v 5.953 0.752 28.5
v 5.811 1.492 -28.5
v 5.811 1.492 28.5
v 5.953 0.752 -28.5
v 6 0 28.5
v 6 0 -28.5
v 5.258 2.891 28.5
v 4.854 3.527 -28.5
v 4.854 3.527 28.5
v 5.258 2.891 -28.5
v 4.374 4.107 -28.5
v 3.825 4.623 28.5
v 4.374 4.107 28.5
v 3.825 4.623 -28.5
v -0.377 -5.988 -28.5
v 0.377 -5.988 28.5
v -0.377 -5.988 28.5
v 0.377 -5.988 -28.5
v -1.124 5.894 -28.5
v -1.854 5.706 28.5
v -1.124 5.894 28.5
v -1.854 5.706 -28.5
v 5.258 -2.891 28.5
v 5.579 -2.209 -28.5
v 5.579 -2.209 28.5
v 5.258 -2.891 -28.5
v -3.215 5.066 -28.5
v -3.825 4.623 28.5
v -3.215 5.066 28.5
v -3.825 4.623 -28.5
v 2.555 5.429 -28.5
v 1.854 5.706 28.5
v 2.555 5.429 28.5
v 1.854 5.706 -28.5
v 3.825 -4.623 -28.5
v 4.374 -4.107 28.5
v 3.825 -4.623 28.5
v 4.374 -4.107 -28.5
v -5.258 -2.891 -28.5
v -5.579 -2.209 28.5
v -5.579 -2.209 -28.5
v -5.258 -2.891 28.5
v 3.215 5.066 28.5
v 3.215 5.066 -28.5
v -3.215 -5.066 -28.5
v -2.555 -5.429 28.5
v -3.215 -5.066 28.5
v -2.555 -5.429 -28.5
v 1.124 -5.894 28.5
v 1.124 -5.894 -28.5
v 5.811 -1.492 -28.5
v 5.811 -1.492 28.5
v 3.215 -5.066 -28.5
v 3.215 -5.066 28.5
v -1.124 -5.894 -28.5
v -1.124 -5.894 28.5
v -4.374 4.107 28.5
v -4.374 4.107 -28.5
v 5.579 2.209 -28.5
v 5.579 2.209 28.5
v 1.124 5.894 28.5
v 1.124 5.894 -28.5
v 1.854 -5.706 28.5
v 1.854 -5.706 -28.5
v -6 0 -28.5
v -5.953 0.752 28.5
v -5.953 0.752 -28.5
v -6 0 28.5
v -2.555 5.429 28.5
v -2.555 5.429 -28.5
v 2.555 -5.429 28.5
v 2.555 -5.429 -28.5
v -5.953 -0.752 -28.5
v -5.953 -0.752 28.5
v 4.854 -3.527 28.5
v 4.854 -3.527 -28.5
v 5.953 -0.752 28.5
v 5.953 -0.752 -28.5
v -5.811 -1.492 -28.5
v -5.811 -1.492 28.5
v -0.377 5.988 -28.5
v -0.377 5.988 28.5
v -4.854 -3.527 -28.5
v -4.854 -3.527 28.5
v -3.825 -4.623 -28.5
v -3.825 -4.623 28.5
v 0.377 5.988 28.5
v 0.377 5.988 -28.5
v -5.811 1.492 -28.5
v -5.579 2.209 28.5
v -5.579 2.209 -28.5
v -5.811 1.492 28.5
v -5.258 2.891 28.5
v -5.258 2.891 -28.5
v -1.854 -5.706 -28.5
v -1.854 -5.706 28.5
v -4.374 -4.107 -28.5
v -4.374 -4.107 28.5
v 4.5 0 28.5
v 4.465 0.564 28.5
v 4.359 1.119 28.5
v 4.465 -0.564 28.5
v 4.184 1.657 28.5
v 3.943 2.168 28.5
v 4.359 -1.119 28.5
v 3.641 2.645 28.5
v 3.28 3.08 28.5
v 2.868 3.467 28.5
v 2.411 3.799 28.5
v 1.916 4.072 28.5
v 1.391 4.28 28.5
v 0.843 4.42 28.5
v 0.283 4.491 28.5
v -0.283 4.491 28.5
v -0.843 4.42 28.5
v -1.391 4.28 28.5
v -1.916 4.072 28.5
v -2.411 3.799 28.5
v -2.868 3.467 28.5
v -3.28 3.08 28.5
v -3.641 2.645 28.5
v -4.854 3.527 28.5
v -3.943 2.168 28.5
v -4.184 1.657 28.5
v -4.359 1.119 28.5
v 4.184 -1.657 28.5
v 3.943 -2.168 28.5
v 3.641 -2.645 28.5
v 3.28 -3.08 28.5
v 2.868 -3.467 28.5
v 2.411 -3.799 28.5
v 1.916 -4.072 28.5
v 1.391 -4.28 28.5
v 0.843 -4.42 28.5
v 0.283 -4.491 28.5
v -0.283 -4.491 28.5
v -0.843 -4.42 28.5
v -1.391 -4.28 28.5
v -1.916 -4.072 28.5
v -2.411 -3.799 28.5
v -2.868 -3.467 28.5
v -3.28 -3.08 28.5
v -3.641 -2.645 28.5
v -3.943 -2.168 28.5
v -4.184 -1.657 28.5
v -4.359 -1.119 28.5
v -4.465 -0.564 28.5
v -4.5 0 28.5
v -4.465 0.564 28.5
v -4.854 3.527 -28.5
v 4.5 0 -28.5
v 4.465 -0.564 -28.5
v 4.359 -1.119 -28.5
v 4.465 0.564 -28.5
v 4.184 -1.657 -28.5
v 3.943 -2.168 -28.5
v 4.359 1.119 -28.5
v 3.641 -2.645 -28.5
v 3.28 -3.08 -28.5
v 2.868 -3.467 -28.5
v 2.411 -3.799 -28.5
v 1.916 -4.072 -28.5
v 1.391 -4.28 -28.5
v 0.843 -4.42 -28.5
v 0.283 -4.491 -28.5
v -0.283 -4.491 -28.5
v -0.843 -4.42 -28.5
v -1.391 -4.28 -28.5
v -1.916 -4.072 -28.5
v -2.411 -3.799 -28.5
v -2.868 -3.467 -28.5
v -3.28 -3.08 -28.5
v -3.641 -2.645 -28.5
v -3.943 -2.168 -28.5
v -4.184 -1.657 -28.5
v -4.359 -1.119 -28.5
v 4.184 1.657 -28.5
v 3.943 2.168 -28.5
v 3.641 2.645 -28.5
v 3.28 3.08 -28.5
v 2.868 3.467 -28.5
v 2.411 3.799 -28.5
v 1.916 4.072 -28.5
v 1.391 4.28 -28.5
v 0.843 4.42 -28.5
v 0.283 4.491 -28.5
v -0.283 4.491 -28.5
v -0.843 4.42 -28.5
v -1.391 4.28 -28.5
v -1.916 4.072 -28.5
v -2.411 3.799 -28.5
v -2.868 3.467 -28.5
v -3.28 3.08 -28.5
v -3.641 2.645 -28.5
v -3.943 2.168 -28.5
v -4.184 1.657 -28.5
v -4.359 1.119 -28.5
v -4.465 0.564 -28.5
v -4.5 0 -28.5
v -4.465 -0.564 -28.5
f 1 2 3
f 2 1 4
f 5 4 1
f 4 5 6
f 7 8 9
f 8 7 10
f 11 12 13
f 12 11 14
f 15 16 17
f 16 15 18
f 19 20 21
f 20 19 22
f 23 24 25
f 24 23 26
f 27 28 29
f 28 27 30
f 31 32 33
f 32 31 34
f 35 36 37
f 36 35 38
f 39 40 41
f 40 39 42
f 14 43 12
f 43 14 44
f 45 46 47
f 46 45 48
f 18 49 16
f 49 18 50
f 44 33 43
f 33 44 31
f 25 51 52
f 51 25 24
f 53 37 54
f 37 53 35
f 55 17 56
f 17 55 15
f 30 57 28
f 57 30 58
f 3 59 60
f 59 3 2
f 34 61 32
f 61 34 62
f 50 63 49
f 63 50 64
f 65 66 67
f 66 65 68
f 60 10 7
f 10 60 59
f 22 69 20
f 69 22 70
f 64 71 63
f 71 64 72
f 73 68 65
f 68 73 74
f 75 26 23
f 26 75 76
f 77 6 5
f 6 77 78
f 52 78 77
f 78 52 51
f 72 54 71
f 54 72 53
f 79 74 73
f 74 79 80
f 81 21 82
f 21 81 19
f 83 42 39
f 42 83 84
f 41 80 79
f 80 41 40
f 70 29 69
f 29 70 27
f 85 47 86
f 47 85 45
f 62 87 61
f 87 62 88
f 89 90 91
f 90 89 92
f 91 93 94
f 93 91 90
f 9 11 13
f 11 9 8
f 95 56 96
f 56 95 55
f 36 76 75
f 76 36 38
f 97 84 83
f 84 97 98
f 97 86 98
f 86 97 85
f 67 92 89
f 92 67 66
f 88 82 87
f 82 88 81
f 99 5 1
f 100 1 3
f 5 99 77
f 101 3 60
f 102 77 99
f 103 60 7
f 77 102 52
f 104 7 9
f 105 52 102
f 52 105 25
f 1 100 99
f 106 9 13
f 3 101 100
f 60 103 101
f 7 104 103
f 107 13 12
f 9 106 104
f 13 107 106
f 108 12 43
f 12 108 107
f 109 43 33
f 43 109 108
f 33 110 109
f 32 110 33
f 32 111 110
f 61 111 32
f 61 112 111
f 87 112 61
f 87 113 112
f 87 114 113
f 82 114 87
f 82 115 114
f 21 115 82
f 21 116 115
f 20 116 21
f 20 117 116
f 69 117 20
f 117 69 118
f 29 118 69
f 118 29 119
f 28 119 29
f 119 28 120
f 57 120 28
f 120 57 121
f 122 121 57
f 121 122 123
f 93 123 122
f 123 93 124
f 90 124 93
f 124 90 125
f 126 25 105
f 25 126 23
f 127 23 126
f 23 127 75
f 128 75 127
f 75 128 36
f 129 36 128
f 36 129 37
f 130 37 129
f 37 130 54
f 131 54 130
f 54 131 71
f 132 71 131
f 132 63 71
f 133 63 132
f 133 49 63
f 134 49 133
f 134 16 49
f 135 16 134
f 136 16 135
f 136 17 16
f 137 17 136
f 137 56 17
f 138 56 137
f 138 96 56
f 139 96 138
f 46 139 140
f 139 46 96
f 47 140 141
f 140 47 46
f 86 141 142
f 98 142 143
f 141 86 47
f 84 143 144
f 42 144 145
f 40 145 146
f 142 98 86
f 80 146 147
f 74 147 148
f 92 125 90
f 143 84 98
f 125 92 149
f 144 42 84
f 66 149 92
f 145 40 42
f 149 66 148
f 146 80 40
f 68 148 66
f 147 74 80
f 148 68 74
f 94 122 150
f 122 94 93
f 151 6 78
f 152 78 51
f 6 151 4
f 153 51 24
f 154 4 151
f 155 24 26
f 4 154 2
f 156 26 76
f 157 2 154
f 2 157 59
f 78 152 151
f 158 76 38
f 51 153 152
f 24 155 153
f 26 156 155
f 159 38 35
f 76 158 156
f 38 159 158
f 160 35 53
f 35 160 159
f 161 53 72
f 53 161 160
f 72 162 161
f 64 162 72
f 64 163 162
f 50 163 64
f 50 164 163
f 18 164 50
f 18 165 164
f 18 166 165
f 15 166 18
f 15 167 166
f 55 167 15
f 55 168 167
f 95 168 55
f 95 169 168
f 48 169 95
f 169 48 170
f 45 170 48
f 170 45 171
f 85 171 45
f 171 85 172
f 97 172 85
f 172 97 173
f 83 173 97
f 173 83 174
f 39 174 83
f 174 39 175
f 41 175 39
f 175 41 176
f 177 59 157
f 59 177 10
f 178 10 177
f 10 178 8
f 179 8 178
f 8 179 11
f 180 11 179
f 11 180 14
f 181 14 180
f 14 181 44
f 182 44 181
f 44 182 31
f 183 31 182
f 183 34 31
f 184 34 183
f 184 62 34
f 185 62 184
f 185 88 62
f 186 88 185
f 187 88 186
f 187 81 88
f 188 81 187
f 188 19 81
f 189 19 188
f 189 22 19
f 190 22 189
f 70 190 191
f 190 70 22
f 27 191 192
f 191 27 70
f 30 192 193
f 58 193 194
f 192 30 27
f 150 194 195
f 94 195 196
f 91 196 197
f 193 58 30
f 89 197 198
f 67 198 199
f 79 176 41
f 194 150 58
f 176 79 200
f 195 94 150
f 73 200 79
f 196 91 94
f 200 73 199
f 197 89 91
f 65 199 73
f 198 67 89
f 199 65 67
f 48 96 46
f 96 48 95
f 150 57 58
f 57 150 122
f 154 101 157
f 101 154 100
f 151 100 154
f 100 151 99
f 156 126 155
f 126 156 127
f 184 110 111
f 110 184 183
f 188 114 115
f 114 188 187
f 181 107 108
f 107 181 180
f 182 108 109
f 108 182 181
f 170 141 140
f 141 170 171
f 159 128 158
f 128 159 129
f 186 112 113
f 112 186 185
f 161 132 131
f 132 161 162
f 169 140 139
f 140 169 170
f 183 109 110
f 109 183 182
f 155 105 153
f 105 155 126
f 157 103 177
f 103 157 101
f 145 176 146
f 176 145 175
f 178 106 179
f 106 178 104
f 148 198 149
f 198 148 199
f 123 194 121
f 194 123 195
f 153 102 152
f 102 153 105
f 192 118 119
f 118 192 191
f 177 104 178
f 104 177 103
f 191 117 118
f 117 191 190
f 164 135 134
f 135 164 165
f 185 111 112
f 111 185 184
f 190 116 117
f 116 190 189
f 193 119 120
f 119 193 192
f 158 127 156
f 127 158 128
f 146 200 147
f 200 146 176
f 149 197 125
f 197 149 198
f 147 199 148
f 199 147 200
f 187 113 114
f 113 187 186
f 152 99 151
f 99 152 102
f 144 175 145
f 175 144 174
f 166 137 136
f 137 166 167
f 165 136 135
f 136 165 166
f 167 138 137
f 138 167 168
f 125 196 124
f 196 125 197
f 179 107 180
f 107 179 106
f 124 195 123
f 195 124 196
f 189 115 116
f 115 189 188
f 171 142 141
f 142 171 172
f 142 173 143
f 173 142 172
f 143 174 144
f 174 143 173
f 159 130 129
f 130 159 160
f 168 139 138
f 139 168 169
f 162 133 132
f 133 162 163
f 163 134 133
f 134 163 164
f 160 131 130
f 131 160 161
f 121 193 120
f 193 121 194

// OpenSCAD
$fn = 50;


difference() {
	union() {
		translate(v = [0, 0, -28.5000000000]) {
			cylinder(h = 57, r = 6.0000000000);
		}
	}
	union() {
		translate(v = [0, 0, -100.0000000000]) {
			cylinder(h = 200, r = 4.5000000000);
		}
	}
}
